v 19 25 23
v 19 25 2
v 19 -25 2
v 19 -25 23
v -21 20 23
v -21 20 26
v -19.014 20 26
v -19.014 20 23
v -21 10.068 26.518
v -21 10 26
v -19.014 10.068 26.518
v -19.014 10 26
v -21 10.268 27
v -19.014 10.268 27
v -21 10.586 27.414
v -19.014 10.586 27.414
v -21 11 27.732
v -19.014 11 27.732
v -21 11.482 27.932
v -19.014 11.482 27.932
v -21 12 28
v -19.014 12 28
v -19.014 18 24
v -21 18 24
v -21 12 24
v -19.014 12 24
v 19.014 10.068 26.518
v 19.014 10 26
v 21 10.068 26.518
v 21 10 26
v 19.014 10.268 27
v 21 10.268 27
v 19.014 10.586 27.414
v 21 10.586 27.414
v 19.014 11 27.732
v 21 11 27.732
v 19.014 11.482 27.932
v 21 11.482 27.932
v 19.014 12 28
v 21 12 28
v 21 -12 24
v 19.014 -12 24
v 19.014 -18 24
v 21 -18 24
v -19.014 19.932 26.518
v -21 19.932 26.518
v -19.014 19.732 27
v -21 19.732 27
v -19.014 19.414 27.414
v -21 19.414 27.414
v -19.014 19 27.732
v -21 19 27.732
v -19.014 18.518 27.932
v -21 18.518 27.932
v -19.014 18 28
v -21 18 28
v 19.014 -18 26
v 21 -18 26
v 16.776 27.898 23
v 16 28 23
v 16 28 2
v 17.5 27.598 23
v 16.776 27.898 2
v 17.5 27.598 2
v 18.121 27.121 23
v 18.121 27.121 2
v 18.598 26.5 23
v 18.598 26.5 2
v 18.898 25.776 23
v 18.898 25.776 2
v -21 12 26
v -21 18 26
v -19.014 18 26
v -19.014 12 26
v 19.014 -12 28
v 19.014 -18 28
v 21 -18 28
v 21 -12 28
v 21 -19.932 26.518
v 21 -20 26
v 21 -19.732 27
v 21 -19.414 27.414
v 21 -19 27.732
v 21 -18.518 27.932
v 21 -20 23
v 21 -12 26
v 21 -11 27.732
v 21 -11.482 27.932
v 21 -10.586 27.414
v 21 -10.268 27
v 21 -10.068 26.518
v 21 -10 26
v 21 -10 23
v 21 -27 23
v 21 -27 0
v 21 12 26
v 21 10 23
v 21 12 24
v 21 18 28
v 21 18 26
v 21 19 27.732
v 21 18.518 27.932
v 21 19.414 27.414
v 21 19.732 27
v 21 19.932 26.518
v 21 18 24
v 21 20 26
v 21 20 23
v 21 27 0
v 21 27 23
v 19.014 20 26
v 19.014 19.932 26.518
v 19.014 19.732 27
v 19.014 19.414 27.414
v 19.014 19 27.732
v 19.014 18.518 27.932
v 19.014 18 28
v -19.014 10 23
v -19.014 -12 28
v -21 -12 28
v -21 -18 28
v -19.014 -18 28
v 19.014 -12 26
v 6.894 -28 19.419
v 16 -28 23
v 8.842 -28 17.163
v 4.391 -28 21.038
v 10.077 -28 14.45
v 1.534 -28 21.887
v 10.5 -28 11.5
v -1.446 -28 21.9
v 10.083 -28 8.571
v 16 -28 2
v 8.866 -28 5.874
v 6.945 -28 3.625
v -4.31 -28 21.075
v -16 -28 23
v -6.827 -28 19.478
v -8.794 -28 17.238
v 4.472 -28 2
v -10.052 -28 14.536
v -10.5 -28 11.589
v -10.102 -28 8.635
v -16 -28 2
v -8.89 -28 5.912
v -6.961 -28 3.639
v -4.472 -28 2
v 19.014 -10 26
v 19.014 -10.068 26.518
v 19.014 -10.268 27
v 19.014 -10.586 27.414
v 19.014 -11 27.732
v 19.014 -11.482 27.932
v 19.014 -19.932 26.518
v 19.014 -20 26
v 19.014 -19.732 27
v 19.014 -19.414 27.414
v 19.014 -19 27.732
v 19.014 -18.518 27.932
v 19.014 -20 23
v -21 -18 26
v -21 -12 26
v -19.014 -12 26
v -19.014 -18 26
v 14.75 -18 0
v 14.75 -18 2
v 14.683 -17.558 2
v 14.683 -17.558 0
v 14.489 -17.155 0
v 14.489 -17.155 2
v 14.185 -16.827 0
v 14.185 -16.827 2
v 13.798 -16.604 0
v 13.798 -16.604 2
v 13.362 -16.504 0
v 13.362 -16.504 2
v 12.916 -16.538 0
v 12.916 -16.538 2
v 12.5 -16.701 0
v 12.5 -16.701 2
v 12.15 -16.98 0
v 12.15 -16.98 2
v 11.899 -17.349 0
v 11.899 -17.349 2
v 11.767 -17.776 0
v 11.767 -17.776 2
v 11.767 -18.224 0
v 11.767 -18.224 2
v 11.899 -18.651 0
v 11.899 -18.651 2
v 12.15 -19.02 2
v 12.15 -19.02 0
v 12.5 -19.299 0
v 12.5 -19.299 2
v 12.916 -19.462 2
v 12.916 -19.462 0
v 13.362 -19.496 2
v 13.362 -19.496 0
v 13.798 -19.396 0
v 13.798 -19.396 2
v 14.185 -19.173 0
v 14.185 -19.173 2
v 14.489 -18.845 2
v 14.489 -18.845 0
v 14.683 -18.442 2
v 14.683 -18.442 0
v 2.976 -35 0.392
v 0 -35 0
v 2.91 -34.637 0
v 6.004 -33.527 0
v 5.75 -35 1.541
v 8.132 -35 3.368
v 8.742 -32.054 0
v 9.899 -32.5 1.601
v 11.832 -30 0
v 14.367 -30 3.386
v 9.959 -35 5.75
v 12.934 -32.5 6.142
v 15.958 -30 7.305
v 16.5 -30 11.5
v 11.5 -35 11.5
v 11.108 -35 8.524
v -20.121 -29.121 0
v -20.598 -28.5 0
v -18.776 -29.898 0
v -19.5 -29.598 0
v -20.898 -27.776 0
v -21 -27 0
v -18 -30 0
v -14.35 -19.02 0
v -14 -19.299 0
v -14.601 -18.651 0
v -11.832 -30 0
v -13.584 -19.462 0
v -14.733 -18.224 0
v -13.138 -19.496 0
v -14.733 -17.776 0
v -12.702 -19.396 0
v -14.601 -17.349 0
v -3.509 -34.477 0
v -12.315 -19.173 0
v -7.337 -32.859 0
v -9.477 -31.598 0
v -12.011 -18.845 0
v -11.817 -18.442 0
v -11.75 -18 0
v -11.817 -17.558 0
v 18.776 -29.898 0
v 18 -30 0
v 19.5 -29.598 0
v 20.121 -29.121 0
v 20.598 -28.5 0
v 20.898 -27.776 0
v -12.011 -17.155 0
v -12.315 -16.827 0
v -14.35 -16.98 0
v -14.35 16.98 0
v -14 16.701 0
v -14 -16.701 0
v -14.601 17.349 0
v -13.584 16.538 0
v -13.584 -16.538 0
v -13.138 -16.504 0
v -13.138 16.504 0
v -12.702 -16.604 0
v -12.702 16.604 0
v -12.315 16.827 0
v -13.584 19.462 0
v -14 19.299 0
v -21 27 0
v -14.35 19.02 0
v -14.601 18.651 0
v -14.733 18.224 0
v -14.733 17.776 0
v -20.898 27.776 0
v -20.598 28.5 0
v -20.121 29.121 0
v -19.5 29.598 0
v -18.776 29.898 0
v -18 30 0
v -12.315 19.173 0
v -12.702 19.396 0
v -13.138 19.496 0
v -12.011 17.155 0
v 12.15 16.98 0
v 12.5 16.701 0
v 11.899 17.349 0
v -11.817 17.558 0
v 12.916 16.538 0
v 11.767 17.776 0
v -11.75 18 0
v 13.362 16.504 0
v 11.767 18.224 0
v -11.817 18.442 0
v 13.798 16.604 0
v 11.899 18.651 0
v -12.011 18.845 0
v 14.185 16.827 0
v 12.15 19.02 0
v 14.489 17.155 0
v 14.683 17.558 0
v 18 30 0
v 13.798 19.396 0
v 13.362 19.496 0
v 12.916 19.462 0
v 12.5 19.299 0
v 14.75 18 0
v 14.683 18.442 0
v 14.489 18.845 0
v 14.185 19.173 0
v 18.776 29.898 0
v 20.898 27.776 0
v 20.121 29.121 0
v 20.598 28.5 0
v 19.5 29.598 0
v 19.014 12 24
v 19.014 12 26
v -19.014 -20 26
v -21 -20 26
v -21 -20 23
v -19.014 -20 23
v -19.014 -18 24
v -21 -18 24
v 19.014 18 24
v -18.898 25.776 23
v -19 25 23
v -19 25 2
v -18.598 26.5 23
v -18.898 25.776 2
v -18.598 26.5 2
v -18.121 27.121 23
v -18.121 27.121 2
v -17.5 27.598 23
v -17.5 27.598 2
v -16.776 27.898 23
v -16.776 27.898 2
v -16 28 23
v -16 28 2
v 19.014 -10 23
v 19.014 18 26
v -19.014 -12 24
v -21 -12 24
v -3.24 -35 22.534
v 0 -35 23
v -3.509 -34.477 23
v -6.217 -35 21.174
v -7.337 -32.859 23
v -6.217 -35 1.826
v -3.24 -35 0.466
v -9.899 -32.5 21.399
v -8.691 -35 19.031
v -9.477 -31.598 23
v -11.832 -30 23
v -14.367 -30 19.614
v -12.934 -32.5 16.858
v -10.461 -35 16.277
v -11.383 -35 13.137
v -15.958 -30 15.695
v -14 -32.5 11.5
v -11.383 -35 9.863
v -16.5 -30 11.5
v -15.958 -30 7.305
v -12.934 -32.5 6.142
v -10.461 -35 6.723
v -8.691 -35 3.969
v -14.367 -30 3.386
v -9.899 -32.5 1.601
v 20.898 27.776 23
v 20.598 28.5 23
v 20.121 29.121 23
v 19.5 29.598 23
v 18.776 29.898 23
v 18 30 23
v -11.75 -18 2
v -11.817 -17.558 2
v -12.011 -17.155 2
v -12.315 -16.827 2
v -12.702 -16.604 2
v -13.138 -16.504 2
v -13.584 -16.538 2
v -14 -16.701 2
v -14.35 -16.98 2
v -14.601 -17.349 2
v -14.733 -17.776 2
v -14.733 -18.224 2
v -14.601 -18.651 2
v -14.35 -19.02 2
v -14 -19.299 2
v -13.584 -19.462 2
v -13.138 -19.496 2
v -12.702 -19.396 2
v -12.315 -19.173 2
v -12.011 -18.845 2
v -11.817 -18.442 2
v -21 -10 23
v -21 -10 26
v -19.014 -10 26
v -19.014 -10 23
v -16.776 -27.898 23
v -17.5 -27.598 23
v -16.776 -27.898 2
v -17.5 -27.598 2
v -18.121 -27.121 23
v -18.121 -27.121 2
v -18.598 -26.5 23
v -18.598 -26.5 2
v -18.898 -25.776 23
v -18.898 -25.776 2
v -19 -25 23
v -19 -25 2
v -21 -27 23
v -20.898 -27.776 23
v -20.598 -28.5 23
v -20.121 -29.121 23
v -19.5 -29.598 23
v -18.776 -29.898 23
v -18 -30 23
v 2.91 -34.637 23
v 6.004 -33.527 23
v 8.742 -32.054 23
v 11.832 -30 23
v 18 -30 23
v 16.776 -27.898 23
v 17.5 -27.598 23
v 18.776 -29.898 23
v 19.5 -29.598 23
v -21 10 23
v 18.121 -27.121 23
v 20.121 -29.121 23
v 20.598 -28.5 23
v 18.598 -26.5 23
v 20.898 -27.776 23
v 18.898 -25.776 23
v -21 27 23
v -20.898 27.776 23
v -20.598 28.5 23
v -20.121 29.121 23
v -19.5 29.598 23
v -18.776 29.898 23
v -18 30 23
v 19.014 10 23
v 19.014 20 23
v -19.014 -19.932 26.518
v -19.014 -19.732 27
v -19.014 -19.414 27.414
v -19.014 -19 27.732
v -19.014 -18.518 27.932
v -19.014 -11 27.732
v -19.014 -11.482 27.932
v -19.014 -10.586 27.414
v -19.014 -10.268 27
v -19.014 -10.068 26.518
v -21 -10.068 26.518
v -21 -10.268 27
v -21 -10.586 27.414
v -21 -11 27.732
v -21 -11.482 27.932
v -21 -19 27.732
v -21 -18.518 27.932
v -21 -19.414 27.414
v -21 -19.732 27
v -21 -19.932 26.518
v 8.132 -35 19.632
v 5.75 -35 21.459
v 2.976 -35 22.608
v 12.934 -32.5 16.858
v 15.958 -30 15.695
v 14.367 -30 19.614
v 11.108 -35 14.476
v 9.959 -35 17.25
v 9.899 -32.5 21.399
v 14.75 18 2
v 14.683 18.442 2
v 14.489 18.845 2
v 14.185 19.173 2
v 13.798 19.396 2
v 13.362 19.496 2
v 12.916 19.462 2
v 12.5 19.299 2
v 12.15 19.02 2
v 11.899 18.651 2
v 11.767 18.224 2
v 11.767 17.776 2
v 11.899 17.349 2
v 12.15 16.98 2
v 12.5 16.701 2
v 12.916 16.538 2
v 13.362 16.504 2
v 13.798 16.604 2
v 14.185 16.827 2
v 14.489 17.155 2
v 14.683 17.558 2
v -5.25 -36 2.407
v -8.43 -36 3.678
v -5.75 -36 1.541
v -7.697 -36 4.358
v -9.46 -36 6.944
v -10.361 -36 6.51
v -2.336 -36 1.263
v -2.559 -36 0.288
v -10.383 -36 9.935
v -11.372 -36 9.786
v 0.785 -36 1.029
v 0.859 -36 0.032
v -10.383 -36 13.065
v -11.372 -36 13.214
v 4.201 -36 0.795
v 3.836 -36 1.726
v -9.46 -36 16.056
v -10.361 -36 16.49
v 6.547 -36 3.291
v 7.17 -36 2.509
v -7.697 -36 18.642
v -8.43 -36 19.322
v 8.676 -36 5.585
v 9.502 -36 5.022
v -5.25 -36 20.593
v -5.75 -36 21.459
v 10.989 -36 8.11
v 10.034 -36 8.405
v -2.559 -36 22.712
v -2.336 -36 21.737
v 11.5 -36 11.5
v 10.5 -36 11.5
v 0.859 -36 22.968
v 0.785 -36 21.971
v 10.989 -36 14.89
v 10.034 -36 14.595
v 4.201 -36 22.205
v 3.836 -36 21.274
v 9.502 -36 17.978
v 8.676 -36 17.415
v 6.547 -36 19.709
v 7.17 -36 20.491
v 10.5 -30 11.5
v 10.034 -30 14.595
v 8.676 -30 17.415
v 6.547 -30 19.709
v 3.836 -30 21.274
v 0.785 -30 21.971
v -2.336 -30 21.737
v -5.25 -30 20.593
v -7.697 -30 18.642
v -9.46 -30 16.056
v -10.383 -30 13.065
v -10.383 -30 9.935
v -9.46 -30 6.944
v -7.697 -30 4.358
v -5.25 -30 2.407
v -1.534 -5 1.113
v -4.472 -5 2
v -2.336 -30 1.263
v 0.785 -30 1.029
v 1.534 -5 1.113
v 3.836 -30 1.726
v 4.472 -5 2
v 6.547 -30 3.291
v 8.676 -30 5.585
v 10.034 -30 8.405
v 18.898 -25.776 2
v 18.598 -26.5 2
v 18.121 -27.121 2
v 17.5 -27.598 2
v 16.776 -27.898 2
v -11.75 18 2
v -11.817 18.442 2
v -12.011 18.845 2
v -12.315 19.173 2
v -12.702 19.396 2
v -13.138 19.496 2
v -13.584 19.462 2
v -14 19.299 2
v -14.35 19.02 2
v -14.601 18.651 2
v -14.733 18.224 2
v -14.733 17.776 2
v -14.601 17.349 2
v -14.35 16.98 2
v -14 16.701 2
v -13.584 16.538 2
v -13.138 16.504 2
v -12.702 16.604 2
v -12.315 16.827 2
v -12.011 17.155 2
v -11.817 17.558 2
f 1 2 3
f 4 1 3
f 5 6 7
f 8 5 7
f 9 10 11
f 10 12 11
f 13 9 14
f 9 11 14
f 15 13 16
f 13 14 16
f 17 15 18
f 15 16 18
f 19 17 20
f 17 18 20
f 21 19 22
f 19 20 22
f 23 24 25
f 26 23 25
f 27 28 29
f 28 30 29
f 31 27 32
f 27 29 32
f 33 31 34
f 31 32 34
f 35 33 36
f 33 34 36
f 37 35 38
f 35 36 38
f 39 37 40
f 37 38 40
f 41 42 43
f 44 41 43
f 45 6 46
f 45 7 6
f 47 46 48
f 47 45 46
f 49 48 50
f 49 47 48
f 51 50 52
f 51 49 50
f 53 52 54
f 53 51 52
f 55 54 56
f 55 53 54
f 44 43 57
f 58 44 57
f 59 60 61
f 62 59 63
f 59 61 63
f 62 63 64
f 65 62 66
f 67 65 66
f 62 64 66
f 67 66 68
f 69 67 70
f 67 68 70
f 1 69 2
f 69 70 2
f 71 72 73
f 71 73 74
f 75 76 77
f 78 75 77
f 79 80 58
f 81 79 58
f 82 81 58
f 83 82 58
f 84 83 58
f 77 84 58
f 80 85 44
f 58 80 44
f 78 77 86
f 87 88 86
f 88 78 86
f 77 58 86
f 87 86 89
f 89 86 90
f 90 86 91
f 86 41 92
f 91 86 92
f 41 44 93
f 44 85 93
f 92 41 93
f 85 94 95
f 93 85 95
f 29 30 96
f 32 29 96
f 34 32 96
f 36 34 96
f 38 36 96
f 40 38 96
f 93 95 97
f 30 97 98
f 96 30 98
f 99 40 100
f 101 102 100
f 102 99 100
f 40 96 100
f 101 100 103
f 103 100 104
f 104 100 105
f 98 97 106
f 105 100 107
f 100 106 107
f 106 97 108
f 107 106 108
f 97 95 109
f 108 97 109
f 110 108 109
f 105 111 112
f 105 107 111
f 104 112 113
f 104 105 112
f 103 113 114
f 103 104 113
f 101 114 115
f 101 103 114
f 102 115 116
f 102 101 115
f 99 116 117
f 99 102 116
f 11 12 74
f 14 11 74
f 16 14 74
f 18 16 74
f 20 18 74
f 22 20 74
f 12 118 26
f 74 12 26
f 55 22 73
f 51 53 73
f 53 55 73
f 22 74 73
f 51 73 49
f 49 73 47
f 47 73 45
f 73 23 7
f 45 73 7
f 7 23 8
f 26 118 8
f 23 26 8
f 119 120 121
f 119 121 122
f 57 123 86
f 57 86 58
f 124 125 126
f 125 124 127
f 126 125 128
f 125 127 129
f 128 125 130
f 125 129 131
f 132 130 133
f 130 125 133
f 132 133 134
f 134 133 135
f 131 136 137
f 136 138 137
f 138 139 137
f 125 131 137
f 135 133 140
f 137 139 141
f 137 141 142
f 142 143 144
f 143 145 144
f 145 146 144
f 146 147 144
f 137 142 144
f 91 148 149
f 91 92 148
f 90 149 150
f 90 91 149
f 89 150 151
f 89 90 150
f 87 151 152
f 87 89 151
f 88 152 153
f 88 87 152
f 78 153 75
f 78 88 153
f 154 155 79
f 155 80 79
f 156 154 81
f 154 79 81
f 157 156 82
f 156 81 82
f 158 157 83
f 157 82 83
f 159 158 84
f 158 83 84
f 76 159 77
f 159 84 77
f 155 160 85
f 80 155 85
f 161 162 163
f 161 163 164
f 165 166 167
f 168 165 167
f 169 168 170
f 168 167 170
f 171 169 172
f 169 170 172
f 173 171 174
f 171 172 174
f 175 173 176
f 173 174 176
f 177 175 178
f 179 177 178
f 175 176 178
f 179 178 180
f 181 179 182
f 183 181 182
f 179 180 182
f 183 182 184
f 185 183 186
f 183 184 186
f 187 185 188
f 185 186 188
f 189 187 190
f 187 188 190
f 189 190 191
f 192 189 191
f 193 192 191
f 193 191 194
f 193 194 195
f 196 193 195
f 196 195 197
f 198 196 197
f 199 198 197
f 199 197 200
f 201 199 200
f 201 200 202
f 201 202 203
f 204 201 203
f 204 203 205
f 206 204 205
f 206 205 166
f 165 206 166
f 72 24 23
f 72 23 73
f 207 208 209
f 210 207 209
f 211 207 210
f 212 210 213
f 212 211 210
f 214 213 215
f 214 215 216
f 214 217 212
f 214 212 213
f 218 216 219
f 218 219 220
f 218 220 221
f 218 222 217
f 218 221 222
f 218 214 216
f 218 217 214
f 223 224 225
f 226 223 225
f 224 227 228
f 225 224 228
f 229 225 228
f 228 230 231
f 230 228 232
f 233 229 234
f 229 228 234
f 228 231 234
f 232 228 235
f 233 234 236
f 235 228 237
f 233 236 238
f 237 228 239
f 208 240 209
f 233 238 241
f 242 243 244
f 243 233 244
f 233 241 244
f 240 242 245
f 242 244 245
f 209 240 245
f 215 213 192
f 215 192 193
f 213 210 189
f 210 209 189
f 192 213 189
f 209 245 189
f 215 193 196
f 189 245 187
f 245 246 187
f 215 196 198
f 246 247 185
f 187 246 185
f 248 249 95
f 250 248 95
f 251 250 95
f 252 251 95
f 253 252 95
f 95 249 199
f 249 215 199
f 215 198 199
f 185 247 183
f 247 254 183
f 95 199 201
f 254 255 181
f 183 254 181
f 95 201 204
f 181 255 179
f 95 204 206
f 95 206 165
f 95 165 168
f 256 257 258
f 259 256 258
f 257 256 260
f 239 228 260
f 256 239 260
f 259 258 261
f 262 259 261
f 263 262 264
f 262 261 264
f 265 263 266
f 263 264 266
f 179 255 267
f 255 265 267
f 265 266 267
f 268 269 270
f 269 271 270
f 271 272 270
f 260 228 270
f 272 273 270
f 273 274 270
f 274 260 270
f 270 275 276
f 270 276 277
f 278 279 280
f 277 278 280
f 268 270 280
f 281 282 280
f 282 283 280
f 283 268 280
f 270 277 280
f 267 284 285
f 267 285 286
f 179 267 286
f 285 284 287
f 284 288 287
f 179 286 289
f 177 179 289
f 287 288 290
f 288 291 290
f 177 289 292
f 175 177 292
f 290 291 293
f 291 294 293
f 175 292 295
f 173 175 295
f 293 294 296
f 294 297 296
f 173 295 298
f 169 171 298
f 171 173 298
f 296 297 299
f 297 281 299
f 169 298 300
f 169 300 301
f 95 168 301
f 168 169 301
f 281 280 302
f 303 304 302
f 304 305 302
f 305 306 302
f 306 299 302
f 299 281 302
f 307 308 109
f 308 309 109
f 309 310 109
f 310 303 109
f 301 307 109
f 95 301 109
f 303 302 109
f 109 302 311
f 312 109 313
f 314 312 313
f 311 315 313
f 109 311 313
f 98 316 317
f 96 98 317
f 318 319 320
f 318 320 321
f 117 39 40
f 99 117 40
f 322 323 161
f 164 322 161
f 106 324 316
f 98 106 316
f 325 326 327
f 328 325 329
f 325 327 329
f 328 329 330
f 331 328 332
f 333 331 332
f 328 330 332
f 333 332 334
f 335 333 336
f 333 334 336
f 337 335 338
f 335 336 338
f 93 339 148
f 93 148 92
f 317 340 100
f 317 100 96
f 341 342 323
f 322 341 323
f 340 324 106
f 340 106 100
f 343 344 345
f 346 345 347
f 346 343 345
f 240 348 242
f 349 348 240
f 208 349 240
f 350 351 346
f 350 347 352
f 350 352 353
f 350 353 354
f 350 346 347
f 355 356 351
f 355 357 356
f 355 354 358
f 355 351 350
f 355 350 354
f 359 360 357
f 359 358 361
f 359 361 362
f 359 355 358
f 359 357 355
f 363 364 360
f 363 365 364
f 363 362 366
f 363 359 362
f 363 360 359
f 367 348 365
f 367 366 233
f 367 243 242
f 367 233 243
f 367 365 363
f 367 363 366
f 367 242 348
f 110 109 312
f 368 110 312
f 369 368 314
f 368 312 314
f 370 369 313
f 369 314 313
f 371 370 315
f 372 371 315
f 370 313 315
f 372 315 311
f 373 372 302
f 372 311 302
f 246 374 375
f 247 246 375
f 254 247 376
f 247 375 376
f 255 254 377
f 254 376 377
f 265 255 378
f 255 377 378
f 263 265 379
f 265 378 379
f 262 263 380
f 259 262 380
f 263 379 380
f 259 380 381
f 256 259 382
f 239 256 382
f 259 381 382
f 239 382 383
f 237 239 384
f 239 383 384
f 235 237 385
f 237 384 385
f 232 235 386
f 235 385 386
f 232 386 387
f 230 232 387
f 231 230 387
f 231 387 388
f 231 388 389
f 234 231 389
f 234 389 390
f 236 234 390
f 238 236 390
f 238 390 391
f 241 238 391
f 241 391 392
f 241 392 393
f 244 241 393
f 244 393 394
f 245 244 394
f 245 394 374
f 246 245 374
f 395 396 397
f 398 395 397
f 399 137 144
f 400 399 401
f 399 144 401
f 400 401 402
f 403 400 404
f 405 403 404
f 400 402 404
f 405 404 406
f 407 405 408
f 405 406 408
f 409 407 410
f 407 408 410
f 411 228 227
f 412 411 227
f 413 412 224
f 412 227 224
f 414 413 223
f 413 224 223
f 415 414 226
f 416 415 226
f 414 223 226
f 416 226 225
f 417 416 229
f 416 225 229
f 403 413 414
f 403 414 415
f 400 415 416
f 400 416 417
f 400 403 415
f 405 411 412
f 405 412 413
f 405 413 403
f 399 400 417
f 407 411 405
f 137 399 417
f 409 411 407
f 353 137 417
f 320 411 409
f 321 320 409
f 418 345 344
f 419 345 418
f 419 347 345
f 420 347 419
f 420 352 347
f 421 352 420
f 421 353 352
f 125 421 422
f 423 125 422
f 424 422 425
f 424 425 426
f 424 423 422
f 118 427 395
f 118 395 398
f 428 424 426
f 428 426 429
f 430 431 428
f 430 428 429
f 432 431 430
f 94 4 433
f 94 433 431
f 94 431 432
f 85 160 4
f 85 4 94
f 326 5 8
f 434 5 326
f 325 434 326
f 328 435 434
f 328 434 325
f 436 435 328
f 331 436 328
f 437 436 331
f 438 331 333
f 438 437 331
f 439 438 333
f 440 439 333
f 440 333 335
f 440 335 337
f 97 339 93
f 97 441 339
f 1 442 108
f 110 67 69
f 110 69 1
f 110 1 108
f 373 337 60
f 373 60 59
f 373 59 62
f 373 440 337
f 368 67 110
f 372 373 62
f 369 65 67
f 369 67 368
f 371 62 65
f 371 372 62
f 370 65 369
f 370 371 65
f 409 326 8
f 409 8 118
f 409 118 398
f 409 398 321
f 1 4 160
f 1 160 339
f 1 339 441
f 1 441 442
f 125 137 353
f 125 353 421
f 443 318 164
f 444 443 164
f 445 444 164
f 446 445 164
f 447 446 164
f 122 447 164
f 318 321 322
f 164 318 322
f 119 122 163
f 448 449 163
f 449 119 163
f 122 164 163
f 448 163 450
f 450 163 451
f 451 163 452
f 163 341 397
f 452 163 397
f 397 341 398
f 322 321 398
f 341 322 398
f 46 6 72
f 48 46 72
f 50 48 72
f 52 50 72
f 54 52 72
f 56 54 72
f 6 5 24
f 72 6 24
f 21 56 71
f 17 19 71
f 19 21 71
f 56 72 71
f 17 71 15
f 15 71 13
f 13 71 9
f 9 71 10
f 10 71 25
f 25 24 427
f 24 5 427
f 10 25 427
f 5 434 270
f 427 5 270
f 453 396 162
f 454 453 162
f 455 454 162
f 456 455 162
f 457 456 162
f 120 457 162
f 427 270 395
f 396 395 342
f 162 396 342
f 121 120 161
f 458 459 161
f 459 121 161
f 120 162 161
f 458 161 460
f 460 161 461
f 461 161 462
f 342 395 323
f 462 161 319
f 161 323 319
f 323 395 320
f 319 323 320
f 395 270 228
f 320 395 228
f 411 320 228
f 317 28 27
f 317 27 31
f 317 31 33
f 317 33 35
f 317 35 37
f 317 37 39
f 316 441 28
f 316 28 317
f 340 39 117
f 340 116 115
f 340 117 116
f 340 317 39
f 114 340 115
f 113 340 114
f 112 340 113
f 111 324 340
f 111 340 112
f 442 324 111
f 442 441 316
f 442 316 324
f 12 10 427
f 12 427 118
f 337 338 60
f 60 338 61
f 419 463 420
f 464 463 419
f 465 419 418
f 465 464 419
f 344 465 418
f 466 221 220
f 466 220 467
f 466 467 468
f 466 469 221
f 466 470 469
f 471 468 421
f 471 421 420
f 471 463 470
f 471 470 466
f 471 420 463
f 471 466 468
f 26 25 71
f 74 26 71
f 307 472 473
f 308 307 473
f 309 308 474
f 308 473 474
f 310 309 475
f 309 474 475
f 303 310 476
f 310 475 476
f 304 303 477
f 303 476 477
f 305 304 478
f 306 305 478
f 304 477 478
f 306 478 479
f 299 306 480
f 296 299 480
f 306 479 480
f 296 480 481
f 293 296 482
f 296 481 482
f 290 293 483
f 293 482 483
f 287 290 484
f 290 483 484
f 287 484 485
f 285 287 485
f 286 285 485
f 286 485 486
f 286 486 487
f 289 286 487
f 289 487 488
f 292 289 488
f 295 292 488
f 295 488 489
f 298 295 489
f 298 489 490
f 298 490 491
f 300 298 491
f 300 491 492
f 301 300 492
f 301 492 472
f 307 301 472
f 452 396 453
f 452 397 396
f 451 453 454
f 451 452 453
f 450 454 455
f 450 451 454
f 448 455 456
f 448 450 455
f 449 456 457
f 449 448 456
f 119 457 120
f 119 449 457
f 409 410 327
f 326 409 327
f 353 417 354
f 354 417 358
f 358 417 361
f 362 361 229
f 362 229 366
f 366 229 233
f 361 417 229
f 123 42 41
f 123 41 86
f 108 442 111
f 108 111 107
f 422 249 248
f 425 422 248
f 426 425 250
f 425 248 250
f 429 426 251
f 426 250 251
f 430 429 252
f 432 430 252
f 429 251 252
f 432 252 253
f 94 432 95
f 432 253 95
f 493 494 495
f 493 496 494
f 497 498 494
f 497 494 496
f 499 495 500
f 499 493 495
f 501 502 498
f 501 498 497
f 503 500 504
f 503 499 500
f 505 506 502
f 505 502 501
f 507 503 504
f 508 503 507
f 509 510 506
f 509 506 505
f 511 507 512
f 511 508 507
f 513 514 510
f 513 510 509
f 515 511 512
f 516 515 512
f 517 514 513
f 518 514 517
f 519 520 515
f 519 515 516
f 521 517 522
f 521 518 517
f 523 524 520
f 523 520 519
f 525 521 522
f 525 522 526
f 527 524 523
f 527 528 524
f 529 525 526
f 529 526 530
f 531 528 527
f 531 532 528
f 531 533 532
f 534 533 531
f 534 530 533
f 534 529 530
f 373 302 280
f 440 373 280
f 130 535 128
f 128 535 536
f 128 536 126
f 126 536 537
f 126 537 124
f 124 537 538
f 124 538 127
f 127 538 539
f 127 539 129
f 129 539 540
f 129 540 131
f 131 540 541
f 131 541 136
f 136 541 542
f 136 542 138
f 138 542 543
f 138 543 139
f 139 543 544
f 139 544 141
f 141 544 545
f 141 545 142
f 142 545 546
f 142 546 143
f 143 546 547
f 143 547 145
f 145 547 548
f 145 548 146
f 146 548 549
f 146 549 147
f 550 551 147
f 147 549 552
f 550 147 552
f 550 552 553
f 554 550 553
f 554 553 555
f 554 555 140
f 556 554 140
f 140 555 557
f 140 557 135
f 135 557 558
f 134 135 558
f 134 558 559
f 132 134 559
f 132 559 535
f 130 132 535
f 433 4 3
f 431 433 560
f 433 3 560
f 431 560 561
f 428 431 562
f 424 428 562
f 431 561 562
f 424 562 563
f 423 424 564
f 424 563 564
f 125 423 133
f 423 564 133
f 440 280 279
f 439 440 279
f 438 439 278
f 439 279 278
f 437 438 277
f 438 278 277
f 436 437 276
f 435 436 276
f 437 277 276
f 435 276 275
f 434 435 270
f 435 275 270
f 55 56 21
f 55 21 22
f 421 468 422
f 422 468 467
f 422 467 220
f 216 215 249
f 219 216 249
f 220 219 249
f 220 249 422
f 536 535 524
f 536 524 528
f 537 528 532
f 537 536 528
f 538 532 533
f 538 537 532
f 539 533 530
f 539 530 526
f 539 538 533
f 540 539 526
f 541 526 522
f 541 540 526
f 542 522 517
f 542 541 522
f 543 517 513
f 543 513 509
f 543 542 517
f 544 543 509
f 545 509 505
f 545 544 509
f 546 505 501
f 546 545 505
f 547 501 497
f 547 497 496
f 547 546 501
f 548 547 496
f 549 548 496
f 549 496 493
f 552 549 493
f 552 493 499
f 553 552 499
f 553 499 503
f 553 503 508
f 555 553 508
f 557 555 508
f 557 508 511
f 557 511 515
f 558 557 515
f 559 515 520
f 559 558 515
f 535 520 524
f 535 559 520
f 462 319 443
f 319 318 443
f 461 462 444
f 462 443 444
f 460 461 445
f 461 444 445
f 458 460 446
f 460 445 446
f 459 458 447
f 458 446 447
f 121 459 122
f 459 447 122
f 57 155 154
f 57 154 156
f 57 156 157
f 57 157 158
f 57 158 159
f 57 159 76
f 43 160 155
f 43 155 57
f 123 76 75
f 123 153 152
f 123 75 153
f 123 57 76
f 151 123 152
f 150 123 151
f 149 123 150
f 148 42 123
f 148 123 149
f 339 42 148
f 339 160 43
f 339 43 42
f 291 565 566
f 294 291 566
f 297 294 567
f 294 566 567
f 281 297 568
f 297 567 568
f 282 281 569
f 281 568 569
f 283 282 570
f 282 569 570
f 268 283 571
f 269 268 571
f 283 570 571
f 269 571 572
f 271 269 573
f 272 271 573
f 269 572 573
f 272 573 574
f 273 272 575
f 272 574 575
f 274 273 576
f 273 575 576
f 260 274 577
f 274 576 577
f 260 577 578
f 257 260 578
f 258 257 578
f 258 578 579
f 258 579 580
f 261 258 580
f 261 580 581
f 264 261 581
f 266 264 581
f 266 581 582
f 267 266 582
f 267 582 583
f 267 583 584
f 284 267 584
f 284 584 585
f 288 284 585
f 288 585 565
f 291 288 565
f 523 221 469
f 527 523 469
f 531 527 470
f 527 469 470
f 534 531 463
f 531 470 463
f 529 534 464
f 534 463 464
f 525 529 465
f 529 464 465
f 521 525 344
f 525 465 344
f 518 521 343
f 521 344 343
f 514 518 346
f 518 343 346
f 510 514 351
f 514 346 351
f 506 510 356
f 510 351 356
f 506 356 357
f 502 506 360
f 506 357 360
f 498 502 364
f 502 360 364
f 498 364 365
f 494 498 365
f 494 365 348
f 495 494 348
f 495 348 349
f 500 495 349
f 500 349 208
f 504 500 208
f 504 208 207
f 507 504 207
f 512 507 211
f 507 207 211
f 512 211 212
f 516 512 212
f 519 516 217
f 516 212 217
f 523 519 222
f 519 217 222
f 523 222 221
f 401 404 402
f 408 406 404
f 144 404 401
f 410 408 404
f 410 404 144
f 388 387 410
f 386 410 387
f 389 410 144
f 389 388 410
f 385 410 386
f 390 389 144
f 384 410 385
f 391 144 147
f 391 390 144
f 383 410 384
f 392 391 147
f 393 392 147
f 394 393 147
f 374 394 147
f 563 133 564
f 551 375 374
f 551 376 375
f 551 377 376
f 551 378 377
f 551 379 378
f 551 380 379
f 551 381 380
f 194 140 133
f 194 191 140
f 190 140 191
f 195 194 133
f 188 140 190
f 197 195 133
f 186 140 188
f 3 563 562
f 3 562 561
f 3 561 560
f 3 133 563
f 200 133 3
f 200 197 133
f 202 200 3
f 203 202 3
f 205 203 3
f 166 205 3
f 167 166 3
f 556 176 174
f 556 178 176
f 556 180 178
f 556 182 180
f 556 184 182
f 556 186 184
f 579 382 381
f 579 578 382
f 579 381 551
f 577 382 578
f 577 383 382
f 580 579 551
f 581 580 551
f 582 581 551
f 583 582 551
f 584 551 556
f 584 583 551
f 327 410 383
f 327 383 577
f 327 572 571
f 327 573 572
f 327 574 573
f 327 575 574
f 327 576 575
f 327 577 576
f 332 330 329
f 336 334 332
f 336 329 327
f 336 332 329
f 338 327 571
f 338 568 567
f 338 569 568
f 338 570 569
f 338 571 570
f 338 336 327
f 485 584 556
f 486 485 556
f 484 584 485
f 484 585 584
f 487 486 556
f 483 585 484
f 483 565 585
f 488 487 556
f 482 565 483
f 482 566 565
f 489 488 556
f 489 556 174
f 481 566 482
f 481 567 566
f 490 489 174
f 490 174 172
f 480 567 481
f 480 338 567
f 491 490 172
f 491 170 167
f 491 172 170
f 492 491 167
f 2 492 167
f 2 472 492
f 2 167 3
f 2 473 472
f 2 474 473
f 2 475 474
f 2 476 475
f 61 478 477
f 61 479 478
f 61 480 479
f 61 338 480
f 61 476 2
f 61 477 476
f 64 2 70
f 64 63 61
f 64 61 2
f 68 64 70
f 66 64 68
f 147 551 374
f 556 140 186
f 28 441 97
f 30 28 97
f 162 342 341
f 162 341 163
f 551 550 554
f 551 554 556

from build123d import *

# Parameters (mm, degrees)
F4_DEPTH     = 23
F5_DEPTH     = 2
F6_R         = 11.5
F6_R_2       = 10.5
F7_DEPTH     = 6
F8_DEPTH     = 25
F9_T4_ANGLE  = 179.9999999711
F9_T10_ANGLE = 89.9999998967
F9_T15_ANGLE = 90.0000001322
F10_R        = 1.5
F11_DEPTH    = 2.001
F12_W        = 1.9858112633
F12_H        = 10
F13_DEPTH    = 5
F14_R        = 2
F15_W        = 6
F15_H        = 2
F16_DEPTH    = 42.001


# Not quite as in the source:
# - a fillet or chamfer that OpenCascade refuses, or shapes differently, is made with other operations: its cross-section is extruded or revolved along the edge and cut away or added


with BuildPart() as f4:
    # F3 (on Top) → F4 (new body)
    with BuildSketch(Plane.XY):
        with BuildLine():
            Line((18, 30), (-18, 30))
            ThreePointArc((-18, 30), (-20.1213203436, 29.1213203436), (-21, 27))
            Line((-21, 27), (-21, -27))
            ThreePointArc((-21, -27), (-20.1213203436, -29.1213203436), (-18, -30))
            Line((-18, -30), (18, -30))
            ThreePointArc((18, -30), (20.1213203436, -29.1213203436), (21, -27))
            Line((21, -27), (21, 27))
            ThreePointArc((21, 27), (20.1213203436, 29.1213203436), (18, 30))
        make_face()
        with BuildLine():
            ThreePointArc((-19, 25), (-18.1213203436, 27.1213203436), (-16, 28))
            Line((-16, 28), (16, 28))
            ThreePointArc((16, 28), (18.1213203436, 27.1213203436), (19, 25))
            Line((19, 25), (19, -25))
            ThreePointArc((19, -25), (18.1213203436, -27.1213203436), (16, -28))
            Line((16, -28), (-16, -28))
            ThreePointArc((-16, -28), (-18.1213203436, -27.1213203436), (-19, -25))
            Line((-19, -25), (-19, 25))
        make_face(mode=Mode.SUBTRACT)
    extrude(amount=F4_DEPTH)

    # F3 (on Top) → F5 (join)
    with BuildSketch(Plane.XY):
        with BuildLine():
            Line((16, 28), (-16, 28))
            ThreePointArc((-16, 28), (-18.1213203436, 27.1213203436), (-19, 25))
            Line((-19, 25), (-19, -25))
            ThreePointArc((-19, -25), (-18.1213203436, -27.1213203436), (-16, -28))
            Line((-16, -28), (16, -28))
            ThreePointArc((16, -28), (18.1213203436, -27.1213203436), (19, -25))
            Line((19, -25), (19, 25))
            ThreePointArc((19, 25), (18.1213203436, 27.1213203436), (16, 28))
        make_face()
    extrude(amount=F5_DEPTH)

    # F6 (on face) → F7 (join)
    with BuildSketch(Plane.XZ.offset(30)):
        with Locations((0, 11.5)):
            Circle(F6_R)
        with Locations((0, 11.5)):
            Circle(F6_R_2, mode=Mode.SUBTRACT)
    extrude(amount=F7_DEPTH)

    # F8 (cut): a face of the model
    f8_faces = [f4.faces().sort_by_distance(p)[0] for p in [
        (0, -30, 11.5),
    ]]
    extrude(f8_faces, amount=-F8_DEPTH, mode=Mode.SUBTRACT)

    # F9: chamfer of 5 on 1 edges, made by hand


with BuildPart() as f9_tool2:
    # F9_s3 → F9_t4 (revolve)
    with BuildSketch(Plane.YZ):
        Polygon((-30, 28), (-35, 23), (-30, 23), align=None)
    revolve(axis=Axis((0, -30, 11.5), (0, -1, 0)), revolution_arc=F9_T4_ANGLE)

    split(bisect_by=Plane.XY, keep=Keep.TOP)

    split(bisect_by=Plane.XY.offset(23), keep=Keep.BOTTOM)


with BuildPart() as f4_1:
    add(f4.part)

    # F9_t1: union F9_tool2
    add(f9_tool2.part)


with BuildPart() as f9_tool8:
    # F9_s9 → F9_t10 (revolve)
    with BuildSketch(Plane.XY.offset(11.5)):
        Polygon((16.5, -30), (11.5, -35), (11.5, -30), align=None)
    revolve(axis=Axis((0, -30, 11.5), (0, -1, 0)), revolution_arc=F9_T10_ANGLE)

    split(bisect_by=Plane.XY.offset(23), keep=Keep.BOTTOM)


with BuildPart() as f4_2:
    add(f4_1.part)

    # F9_t7: union F9_tool8
    add(f9_tool8.part)


with BuildPart() as f9_tool13:
    # F9_s14 → F9_t15 (revolve)
    with BuildSketch(Plane.YZ):
        Polygon((-30, -5), (-35, 0), (-30, 0), align=None)
    revolve(axis=Axis((0, -30, 11.5), (0, -1, 0)), revolution_arc=F9_T15_ANGLE)

    split(bisect_by=Plane.XY, keep=Keep.TOP)


with BuildPart() as f4_3:
    add(f4_2.part)

    # F9_t12: union F9_tool13
    add(f9_tool13.part)

    # F10 (on face) → F11 (cut, through all)
    with BuildSketch(Plane.XY.offset(2)):
        with Locations((-13.25, 18)):
            Circle(F10_R)
        with Locations((-13.25, -18)):
            Circle(F10_R)
        with Locations((13.25, 18)):
            Circle(F10_R)
        with Locations((13.25, -18)):
            Circle(F10_R)
    extrude(amount=-F11_DEPTH, mode=Mode.SUBTRACT)

    # F12 (on face) → F13 (join)
    with BuildSketch(Plane.XY.offset(23)):
        with Locations((-20.0070943683, 15)):
            Rectangle(F12_W, F12_H)
        with Locations((-20.0070943683, -15)):
            Rectangle(F12_W, F12_H)
        with Locations((20.0070943683, 15)):
            Rectangle(F12_W, F12_H)
        with Locations((20.0070943683, -15)):
            Rectangle(F12_W, F12_H)
    extrude(amount=F13_DEPTH)

    # F14
    f14_edges = [f4_3.edges().sort_by_distance(p)[0] for p in [
        (-20.007094, -20, 28),
        (-20.007094, -10, 28),
        (-20.007094, 10, 28),
        (-20.007094, 20, 28),
        (20.007094, 20, 28),
        (20.007094, 10, 28),
        (20.007094, -10, 28),
        (20.007094, -20, 28),
    ]]
    fillet(f14_edges, radius=F14_R)

    # F15 (on face) → F16 (cut, through all)
    with BuildSketch(Plane(origin=(-21, 0, 0), x_dir=(0, -1, 0), z_dir=(-1, 0, 0))):
        with Locations((-15, 25)):
            Rectangle(F15_W, F15_H)
        with Locations((15, 25)):
            Rectangle(F15_W, F15_H)
    extrude(amount=-F16_DEPTH, mode=Mode.SUBTRACT)


solid = f4_3.part
